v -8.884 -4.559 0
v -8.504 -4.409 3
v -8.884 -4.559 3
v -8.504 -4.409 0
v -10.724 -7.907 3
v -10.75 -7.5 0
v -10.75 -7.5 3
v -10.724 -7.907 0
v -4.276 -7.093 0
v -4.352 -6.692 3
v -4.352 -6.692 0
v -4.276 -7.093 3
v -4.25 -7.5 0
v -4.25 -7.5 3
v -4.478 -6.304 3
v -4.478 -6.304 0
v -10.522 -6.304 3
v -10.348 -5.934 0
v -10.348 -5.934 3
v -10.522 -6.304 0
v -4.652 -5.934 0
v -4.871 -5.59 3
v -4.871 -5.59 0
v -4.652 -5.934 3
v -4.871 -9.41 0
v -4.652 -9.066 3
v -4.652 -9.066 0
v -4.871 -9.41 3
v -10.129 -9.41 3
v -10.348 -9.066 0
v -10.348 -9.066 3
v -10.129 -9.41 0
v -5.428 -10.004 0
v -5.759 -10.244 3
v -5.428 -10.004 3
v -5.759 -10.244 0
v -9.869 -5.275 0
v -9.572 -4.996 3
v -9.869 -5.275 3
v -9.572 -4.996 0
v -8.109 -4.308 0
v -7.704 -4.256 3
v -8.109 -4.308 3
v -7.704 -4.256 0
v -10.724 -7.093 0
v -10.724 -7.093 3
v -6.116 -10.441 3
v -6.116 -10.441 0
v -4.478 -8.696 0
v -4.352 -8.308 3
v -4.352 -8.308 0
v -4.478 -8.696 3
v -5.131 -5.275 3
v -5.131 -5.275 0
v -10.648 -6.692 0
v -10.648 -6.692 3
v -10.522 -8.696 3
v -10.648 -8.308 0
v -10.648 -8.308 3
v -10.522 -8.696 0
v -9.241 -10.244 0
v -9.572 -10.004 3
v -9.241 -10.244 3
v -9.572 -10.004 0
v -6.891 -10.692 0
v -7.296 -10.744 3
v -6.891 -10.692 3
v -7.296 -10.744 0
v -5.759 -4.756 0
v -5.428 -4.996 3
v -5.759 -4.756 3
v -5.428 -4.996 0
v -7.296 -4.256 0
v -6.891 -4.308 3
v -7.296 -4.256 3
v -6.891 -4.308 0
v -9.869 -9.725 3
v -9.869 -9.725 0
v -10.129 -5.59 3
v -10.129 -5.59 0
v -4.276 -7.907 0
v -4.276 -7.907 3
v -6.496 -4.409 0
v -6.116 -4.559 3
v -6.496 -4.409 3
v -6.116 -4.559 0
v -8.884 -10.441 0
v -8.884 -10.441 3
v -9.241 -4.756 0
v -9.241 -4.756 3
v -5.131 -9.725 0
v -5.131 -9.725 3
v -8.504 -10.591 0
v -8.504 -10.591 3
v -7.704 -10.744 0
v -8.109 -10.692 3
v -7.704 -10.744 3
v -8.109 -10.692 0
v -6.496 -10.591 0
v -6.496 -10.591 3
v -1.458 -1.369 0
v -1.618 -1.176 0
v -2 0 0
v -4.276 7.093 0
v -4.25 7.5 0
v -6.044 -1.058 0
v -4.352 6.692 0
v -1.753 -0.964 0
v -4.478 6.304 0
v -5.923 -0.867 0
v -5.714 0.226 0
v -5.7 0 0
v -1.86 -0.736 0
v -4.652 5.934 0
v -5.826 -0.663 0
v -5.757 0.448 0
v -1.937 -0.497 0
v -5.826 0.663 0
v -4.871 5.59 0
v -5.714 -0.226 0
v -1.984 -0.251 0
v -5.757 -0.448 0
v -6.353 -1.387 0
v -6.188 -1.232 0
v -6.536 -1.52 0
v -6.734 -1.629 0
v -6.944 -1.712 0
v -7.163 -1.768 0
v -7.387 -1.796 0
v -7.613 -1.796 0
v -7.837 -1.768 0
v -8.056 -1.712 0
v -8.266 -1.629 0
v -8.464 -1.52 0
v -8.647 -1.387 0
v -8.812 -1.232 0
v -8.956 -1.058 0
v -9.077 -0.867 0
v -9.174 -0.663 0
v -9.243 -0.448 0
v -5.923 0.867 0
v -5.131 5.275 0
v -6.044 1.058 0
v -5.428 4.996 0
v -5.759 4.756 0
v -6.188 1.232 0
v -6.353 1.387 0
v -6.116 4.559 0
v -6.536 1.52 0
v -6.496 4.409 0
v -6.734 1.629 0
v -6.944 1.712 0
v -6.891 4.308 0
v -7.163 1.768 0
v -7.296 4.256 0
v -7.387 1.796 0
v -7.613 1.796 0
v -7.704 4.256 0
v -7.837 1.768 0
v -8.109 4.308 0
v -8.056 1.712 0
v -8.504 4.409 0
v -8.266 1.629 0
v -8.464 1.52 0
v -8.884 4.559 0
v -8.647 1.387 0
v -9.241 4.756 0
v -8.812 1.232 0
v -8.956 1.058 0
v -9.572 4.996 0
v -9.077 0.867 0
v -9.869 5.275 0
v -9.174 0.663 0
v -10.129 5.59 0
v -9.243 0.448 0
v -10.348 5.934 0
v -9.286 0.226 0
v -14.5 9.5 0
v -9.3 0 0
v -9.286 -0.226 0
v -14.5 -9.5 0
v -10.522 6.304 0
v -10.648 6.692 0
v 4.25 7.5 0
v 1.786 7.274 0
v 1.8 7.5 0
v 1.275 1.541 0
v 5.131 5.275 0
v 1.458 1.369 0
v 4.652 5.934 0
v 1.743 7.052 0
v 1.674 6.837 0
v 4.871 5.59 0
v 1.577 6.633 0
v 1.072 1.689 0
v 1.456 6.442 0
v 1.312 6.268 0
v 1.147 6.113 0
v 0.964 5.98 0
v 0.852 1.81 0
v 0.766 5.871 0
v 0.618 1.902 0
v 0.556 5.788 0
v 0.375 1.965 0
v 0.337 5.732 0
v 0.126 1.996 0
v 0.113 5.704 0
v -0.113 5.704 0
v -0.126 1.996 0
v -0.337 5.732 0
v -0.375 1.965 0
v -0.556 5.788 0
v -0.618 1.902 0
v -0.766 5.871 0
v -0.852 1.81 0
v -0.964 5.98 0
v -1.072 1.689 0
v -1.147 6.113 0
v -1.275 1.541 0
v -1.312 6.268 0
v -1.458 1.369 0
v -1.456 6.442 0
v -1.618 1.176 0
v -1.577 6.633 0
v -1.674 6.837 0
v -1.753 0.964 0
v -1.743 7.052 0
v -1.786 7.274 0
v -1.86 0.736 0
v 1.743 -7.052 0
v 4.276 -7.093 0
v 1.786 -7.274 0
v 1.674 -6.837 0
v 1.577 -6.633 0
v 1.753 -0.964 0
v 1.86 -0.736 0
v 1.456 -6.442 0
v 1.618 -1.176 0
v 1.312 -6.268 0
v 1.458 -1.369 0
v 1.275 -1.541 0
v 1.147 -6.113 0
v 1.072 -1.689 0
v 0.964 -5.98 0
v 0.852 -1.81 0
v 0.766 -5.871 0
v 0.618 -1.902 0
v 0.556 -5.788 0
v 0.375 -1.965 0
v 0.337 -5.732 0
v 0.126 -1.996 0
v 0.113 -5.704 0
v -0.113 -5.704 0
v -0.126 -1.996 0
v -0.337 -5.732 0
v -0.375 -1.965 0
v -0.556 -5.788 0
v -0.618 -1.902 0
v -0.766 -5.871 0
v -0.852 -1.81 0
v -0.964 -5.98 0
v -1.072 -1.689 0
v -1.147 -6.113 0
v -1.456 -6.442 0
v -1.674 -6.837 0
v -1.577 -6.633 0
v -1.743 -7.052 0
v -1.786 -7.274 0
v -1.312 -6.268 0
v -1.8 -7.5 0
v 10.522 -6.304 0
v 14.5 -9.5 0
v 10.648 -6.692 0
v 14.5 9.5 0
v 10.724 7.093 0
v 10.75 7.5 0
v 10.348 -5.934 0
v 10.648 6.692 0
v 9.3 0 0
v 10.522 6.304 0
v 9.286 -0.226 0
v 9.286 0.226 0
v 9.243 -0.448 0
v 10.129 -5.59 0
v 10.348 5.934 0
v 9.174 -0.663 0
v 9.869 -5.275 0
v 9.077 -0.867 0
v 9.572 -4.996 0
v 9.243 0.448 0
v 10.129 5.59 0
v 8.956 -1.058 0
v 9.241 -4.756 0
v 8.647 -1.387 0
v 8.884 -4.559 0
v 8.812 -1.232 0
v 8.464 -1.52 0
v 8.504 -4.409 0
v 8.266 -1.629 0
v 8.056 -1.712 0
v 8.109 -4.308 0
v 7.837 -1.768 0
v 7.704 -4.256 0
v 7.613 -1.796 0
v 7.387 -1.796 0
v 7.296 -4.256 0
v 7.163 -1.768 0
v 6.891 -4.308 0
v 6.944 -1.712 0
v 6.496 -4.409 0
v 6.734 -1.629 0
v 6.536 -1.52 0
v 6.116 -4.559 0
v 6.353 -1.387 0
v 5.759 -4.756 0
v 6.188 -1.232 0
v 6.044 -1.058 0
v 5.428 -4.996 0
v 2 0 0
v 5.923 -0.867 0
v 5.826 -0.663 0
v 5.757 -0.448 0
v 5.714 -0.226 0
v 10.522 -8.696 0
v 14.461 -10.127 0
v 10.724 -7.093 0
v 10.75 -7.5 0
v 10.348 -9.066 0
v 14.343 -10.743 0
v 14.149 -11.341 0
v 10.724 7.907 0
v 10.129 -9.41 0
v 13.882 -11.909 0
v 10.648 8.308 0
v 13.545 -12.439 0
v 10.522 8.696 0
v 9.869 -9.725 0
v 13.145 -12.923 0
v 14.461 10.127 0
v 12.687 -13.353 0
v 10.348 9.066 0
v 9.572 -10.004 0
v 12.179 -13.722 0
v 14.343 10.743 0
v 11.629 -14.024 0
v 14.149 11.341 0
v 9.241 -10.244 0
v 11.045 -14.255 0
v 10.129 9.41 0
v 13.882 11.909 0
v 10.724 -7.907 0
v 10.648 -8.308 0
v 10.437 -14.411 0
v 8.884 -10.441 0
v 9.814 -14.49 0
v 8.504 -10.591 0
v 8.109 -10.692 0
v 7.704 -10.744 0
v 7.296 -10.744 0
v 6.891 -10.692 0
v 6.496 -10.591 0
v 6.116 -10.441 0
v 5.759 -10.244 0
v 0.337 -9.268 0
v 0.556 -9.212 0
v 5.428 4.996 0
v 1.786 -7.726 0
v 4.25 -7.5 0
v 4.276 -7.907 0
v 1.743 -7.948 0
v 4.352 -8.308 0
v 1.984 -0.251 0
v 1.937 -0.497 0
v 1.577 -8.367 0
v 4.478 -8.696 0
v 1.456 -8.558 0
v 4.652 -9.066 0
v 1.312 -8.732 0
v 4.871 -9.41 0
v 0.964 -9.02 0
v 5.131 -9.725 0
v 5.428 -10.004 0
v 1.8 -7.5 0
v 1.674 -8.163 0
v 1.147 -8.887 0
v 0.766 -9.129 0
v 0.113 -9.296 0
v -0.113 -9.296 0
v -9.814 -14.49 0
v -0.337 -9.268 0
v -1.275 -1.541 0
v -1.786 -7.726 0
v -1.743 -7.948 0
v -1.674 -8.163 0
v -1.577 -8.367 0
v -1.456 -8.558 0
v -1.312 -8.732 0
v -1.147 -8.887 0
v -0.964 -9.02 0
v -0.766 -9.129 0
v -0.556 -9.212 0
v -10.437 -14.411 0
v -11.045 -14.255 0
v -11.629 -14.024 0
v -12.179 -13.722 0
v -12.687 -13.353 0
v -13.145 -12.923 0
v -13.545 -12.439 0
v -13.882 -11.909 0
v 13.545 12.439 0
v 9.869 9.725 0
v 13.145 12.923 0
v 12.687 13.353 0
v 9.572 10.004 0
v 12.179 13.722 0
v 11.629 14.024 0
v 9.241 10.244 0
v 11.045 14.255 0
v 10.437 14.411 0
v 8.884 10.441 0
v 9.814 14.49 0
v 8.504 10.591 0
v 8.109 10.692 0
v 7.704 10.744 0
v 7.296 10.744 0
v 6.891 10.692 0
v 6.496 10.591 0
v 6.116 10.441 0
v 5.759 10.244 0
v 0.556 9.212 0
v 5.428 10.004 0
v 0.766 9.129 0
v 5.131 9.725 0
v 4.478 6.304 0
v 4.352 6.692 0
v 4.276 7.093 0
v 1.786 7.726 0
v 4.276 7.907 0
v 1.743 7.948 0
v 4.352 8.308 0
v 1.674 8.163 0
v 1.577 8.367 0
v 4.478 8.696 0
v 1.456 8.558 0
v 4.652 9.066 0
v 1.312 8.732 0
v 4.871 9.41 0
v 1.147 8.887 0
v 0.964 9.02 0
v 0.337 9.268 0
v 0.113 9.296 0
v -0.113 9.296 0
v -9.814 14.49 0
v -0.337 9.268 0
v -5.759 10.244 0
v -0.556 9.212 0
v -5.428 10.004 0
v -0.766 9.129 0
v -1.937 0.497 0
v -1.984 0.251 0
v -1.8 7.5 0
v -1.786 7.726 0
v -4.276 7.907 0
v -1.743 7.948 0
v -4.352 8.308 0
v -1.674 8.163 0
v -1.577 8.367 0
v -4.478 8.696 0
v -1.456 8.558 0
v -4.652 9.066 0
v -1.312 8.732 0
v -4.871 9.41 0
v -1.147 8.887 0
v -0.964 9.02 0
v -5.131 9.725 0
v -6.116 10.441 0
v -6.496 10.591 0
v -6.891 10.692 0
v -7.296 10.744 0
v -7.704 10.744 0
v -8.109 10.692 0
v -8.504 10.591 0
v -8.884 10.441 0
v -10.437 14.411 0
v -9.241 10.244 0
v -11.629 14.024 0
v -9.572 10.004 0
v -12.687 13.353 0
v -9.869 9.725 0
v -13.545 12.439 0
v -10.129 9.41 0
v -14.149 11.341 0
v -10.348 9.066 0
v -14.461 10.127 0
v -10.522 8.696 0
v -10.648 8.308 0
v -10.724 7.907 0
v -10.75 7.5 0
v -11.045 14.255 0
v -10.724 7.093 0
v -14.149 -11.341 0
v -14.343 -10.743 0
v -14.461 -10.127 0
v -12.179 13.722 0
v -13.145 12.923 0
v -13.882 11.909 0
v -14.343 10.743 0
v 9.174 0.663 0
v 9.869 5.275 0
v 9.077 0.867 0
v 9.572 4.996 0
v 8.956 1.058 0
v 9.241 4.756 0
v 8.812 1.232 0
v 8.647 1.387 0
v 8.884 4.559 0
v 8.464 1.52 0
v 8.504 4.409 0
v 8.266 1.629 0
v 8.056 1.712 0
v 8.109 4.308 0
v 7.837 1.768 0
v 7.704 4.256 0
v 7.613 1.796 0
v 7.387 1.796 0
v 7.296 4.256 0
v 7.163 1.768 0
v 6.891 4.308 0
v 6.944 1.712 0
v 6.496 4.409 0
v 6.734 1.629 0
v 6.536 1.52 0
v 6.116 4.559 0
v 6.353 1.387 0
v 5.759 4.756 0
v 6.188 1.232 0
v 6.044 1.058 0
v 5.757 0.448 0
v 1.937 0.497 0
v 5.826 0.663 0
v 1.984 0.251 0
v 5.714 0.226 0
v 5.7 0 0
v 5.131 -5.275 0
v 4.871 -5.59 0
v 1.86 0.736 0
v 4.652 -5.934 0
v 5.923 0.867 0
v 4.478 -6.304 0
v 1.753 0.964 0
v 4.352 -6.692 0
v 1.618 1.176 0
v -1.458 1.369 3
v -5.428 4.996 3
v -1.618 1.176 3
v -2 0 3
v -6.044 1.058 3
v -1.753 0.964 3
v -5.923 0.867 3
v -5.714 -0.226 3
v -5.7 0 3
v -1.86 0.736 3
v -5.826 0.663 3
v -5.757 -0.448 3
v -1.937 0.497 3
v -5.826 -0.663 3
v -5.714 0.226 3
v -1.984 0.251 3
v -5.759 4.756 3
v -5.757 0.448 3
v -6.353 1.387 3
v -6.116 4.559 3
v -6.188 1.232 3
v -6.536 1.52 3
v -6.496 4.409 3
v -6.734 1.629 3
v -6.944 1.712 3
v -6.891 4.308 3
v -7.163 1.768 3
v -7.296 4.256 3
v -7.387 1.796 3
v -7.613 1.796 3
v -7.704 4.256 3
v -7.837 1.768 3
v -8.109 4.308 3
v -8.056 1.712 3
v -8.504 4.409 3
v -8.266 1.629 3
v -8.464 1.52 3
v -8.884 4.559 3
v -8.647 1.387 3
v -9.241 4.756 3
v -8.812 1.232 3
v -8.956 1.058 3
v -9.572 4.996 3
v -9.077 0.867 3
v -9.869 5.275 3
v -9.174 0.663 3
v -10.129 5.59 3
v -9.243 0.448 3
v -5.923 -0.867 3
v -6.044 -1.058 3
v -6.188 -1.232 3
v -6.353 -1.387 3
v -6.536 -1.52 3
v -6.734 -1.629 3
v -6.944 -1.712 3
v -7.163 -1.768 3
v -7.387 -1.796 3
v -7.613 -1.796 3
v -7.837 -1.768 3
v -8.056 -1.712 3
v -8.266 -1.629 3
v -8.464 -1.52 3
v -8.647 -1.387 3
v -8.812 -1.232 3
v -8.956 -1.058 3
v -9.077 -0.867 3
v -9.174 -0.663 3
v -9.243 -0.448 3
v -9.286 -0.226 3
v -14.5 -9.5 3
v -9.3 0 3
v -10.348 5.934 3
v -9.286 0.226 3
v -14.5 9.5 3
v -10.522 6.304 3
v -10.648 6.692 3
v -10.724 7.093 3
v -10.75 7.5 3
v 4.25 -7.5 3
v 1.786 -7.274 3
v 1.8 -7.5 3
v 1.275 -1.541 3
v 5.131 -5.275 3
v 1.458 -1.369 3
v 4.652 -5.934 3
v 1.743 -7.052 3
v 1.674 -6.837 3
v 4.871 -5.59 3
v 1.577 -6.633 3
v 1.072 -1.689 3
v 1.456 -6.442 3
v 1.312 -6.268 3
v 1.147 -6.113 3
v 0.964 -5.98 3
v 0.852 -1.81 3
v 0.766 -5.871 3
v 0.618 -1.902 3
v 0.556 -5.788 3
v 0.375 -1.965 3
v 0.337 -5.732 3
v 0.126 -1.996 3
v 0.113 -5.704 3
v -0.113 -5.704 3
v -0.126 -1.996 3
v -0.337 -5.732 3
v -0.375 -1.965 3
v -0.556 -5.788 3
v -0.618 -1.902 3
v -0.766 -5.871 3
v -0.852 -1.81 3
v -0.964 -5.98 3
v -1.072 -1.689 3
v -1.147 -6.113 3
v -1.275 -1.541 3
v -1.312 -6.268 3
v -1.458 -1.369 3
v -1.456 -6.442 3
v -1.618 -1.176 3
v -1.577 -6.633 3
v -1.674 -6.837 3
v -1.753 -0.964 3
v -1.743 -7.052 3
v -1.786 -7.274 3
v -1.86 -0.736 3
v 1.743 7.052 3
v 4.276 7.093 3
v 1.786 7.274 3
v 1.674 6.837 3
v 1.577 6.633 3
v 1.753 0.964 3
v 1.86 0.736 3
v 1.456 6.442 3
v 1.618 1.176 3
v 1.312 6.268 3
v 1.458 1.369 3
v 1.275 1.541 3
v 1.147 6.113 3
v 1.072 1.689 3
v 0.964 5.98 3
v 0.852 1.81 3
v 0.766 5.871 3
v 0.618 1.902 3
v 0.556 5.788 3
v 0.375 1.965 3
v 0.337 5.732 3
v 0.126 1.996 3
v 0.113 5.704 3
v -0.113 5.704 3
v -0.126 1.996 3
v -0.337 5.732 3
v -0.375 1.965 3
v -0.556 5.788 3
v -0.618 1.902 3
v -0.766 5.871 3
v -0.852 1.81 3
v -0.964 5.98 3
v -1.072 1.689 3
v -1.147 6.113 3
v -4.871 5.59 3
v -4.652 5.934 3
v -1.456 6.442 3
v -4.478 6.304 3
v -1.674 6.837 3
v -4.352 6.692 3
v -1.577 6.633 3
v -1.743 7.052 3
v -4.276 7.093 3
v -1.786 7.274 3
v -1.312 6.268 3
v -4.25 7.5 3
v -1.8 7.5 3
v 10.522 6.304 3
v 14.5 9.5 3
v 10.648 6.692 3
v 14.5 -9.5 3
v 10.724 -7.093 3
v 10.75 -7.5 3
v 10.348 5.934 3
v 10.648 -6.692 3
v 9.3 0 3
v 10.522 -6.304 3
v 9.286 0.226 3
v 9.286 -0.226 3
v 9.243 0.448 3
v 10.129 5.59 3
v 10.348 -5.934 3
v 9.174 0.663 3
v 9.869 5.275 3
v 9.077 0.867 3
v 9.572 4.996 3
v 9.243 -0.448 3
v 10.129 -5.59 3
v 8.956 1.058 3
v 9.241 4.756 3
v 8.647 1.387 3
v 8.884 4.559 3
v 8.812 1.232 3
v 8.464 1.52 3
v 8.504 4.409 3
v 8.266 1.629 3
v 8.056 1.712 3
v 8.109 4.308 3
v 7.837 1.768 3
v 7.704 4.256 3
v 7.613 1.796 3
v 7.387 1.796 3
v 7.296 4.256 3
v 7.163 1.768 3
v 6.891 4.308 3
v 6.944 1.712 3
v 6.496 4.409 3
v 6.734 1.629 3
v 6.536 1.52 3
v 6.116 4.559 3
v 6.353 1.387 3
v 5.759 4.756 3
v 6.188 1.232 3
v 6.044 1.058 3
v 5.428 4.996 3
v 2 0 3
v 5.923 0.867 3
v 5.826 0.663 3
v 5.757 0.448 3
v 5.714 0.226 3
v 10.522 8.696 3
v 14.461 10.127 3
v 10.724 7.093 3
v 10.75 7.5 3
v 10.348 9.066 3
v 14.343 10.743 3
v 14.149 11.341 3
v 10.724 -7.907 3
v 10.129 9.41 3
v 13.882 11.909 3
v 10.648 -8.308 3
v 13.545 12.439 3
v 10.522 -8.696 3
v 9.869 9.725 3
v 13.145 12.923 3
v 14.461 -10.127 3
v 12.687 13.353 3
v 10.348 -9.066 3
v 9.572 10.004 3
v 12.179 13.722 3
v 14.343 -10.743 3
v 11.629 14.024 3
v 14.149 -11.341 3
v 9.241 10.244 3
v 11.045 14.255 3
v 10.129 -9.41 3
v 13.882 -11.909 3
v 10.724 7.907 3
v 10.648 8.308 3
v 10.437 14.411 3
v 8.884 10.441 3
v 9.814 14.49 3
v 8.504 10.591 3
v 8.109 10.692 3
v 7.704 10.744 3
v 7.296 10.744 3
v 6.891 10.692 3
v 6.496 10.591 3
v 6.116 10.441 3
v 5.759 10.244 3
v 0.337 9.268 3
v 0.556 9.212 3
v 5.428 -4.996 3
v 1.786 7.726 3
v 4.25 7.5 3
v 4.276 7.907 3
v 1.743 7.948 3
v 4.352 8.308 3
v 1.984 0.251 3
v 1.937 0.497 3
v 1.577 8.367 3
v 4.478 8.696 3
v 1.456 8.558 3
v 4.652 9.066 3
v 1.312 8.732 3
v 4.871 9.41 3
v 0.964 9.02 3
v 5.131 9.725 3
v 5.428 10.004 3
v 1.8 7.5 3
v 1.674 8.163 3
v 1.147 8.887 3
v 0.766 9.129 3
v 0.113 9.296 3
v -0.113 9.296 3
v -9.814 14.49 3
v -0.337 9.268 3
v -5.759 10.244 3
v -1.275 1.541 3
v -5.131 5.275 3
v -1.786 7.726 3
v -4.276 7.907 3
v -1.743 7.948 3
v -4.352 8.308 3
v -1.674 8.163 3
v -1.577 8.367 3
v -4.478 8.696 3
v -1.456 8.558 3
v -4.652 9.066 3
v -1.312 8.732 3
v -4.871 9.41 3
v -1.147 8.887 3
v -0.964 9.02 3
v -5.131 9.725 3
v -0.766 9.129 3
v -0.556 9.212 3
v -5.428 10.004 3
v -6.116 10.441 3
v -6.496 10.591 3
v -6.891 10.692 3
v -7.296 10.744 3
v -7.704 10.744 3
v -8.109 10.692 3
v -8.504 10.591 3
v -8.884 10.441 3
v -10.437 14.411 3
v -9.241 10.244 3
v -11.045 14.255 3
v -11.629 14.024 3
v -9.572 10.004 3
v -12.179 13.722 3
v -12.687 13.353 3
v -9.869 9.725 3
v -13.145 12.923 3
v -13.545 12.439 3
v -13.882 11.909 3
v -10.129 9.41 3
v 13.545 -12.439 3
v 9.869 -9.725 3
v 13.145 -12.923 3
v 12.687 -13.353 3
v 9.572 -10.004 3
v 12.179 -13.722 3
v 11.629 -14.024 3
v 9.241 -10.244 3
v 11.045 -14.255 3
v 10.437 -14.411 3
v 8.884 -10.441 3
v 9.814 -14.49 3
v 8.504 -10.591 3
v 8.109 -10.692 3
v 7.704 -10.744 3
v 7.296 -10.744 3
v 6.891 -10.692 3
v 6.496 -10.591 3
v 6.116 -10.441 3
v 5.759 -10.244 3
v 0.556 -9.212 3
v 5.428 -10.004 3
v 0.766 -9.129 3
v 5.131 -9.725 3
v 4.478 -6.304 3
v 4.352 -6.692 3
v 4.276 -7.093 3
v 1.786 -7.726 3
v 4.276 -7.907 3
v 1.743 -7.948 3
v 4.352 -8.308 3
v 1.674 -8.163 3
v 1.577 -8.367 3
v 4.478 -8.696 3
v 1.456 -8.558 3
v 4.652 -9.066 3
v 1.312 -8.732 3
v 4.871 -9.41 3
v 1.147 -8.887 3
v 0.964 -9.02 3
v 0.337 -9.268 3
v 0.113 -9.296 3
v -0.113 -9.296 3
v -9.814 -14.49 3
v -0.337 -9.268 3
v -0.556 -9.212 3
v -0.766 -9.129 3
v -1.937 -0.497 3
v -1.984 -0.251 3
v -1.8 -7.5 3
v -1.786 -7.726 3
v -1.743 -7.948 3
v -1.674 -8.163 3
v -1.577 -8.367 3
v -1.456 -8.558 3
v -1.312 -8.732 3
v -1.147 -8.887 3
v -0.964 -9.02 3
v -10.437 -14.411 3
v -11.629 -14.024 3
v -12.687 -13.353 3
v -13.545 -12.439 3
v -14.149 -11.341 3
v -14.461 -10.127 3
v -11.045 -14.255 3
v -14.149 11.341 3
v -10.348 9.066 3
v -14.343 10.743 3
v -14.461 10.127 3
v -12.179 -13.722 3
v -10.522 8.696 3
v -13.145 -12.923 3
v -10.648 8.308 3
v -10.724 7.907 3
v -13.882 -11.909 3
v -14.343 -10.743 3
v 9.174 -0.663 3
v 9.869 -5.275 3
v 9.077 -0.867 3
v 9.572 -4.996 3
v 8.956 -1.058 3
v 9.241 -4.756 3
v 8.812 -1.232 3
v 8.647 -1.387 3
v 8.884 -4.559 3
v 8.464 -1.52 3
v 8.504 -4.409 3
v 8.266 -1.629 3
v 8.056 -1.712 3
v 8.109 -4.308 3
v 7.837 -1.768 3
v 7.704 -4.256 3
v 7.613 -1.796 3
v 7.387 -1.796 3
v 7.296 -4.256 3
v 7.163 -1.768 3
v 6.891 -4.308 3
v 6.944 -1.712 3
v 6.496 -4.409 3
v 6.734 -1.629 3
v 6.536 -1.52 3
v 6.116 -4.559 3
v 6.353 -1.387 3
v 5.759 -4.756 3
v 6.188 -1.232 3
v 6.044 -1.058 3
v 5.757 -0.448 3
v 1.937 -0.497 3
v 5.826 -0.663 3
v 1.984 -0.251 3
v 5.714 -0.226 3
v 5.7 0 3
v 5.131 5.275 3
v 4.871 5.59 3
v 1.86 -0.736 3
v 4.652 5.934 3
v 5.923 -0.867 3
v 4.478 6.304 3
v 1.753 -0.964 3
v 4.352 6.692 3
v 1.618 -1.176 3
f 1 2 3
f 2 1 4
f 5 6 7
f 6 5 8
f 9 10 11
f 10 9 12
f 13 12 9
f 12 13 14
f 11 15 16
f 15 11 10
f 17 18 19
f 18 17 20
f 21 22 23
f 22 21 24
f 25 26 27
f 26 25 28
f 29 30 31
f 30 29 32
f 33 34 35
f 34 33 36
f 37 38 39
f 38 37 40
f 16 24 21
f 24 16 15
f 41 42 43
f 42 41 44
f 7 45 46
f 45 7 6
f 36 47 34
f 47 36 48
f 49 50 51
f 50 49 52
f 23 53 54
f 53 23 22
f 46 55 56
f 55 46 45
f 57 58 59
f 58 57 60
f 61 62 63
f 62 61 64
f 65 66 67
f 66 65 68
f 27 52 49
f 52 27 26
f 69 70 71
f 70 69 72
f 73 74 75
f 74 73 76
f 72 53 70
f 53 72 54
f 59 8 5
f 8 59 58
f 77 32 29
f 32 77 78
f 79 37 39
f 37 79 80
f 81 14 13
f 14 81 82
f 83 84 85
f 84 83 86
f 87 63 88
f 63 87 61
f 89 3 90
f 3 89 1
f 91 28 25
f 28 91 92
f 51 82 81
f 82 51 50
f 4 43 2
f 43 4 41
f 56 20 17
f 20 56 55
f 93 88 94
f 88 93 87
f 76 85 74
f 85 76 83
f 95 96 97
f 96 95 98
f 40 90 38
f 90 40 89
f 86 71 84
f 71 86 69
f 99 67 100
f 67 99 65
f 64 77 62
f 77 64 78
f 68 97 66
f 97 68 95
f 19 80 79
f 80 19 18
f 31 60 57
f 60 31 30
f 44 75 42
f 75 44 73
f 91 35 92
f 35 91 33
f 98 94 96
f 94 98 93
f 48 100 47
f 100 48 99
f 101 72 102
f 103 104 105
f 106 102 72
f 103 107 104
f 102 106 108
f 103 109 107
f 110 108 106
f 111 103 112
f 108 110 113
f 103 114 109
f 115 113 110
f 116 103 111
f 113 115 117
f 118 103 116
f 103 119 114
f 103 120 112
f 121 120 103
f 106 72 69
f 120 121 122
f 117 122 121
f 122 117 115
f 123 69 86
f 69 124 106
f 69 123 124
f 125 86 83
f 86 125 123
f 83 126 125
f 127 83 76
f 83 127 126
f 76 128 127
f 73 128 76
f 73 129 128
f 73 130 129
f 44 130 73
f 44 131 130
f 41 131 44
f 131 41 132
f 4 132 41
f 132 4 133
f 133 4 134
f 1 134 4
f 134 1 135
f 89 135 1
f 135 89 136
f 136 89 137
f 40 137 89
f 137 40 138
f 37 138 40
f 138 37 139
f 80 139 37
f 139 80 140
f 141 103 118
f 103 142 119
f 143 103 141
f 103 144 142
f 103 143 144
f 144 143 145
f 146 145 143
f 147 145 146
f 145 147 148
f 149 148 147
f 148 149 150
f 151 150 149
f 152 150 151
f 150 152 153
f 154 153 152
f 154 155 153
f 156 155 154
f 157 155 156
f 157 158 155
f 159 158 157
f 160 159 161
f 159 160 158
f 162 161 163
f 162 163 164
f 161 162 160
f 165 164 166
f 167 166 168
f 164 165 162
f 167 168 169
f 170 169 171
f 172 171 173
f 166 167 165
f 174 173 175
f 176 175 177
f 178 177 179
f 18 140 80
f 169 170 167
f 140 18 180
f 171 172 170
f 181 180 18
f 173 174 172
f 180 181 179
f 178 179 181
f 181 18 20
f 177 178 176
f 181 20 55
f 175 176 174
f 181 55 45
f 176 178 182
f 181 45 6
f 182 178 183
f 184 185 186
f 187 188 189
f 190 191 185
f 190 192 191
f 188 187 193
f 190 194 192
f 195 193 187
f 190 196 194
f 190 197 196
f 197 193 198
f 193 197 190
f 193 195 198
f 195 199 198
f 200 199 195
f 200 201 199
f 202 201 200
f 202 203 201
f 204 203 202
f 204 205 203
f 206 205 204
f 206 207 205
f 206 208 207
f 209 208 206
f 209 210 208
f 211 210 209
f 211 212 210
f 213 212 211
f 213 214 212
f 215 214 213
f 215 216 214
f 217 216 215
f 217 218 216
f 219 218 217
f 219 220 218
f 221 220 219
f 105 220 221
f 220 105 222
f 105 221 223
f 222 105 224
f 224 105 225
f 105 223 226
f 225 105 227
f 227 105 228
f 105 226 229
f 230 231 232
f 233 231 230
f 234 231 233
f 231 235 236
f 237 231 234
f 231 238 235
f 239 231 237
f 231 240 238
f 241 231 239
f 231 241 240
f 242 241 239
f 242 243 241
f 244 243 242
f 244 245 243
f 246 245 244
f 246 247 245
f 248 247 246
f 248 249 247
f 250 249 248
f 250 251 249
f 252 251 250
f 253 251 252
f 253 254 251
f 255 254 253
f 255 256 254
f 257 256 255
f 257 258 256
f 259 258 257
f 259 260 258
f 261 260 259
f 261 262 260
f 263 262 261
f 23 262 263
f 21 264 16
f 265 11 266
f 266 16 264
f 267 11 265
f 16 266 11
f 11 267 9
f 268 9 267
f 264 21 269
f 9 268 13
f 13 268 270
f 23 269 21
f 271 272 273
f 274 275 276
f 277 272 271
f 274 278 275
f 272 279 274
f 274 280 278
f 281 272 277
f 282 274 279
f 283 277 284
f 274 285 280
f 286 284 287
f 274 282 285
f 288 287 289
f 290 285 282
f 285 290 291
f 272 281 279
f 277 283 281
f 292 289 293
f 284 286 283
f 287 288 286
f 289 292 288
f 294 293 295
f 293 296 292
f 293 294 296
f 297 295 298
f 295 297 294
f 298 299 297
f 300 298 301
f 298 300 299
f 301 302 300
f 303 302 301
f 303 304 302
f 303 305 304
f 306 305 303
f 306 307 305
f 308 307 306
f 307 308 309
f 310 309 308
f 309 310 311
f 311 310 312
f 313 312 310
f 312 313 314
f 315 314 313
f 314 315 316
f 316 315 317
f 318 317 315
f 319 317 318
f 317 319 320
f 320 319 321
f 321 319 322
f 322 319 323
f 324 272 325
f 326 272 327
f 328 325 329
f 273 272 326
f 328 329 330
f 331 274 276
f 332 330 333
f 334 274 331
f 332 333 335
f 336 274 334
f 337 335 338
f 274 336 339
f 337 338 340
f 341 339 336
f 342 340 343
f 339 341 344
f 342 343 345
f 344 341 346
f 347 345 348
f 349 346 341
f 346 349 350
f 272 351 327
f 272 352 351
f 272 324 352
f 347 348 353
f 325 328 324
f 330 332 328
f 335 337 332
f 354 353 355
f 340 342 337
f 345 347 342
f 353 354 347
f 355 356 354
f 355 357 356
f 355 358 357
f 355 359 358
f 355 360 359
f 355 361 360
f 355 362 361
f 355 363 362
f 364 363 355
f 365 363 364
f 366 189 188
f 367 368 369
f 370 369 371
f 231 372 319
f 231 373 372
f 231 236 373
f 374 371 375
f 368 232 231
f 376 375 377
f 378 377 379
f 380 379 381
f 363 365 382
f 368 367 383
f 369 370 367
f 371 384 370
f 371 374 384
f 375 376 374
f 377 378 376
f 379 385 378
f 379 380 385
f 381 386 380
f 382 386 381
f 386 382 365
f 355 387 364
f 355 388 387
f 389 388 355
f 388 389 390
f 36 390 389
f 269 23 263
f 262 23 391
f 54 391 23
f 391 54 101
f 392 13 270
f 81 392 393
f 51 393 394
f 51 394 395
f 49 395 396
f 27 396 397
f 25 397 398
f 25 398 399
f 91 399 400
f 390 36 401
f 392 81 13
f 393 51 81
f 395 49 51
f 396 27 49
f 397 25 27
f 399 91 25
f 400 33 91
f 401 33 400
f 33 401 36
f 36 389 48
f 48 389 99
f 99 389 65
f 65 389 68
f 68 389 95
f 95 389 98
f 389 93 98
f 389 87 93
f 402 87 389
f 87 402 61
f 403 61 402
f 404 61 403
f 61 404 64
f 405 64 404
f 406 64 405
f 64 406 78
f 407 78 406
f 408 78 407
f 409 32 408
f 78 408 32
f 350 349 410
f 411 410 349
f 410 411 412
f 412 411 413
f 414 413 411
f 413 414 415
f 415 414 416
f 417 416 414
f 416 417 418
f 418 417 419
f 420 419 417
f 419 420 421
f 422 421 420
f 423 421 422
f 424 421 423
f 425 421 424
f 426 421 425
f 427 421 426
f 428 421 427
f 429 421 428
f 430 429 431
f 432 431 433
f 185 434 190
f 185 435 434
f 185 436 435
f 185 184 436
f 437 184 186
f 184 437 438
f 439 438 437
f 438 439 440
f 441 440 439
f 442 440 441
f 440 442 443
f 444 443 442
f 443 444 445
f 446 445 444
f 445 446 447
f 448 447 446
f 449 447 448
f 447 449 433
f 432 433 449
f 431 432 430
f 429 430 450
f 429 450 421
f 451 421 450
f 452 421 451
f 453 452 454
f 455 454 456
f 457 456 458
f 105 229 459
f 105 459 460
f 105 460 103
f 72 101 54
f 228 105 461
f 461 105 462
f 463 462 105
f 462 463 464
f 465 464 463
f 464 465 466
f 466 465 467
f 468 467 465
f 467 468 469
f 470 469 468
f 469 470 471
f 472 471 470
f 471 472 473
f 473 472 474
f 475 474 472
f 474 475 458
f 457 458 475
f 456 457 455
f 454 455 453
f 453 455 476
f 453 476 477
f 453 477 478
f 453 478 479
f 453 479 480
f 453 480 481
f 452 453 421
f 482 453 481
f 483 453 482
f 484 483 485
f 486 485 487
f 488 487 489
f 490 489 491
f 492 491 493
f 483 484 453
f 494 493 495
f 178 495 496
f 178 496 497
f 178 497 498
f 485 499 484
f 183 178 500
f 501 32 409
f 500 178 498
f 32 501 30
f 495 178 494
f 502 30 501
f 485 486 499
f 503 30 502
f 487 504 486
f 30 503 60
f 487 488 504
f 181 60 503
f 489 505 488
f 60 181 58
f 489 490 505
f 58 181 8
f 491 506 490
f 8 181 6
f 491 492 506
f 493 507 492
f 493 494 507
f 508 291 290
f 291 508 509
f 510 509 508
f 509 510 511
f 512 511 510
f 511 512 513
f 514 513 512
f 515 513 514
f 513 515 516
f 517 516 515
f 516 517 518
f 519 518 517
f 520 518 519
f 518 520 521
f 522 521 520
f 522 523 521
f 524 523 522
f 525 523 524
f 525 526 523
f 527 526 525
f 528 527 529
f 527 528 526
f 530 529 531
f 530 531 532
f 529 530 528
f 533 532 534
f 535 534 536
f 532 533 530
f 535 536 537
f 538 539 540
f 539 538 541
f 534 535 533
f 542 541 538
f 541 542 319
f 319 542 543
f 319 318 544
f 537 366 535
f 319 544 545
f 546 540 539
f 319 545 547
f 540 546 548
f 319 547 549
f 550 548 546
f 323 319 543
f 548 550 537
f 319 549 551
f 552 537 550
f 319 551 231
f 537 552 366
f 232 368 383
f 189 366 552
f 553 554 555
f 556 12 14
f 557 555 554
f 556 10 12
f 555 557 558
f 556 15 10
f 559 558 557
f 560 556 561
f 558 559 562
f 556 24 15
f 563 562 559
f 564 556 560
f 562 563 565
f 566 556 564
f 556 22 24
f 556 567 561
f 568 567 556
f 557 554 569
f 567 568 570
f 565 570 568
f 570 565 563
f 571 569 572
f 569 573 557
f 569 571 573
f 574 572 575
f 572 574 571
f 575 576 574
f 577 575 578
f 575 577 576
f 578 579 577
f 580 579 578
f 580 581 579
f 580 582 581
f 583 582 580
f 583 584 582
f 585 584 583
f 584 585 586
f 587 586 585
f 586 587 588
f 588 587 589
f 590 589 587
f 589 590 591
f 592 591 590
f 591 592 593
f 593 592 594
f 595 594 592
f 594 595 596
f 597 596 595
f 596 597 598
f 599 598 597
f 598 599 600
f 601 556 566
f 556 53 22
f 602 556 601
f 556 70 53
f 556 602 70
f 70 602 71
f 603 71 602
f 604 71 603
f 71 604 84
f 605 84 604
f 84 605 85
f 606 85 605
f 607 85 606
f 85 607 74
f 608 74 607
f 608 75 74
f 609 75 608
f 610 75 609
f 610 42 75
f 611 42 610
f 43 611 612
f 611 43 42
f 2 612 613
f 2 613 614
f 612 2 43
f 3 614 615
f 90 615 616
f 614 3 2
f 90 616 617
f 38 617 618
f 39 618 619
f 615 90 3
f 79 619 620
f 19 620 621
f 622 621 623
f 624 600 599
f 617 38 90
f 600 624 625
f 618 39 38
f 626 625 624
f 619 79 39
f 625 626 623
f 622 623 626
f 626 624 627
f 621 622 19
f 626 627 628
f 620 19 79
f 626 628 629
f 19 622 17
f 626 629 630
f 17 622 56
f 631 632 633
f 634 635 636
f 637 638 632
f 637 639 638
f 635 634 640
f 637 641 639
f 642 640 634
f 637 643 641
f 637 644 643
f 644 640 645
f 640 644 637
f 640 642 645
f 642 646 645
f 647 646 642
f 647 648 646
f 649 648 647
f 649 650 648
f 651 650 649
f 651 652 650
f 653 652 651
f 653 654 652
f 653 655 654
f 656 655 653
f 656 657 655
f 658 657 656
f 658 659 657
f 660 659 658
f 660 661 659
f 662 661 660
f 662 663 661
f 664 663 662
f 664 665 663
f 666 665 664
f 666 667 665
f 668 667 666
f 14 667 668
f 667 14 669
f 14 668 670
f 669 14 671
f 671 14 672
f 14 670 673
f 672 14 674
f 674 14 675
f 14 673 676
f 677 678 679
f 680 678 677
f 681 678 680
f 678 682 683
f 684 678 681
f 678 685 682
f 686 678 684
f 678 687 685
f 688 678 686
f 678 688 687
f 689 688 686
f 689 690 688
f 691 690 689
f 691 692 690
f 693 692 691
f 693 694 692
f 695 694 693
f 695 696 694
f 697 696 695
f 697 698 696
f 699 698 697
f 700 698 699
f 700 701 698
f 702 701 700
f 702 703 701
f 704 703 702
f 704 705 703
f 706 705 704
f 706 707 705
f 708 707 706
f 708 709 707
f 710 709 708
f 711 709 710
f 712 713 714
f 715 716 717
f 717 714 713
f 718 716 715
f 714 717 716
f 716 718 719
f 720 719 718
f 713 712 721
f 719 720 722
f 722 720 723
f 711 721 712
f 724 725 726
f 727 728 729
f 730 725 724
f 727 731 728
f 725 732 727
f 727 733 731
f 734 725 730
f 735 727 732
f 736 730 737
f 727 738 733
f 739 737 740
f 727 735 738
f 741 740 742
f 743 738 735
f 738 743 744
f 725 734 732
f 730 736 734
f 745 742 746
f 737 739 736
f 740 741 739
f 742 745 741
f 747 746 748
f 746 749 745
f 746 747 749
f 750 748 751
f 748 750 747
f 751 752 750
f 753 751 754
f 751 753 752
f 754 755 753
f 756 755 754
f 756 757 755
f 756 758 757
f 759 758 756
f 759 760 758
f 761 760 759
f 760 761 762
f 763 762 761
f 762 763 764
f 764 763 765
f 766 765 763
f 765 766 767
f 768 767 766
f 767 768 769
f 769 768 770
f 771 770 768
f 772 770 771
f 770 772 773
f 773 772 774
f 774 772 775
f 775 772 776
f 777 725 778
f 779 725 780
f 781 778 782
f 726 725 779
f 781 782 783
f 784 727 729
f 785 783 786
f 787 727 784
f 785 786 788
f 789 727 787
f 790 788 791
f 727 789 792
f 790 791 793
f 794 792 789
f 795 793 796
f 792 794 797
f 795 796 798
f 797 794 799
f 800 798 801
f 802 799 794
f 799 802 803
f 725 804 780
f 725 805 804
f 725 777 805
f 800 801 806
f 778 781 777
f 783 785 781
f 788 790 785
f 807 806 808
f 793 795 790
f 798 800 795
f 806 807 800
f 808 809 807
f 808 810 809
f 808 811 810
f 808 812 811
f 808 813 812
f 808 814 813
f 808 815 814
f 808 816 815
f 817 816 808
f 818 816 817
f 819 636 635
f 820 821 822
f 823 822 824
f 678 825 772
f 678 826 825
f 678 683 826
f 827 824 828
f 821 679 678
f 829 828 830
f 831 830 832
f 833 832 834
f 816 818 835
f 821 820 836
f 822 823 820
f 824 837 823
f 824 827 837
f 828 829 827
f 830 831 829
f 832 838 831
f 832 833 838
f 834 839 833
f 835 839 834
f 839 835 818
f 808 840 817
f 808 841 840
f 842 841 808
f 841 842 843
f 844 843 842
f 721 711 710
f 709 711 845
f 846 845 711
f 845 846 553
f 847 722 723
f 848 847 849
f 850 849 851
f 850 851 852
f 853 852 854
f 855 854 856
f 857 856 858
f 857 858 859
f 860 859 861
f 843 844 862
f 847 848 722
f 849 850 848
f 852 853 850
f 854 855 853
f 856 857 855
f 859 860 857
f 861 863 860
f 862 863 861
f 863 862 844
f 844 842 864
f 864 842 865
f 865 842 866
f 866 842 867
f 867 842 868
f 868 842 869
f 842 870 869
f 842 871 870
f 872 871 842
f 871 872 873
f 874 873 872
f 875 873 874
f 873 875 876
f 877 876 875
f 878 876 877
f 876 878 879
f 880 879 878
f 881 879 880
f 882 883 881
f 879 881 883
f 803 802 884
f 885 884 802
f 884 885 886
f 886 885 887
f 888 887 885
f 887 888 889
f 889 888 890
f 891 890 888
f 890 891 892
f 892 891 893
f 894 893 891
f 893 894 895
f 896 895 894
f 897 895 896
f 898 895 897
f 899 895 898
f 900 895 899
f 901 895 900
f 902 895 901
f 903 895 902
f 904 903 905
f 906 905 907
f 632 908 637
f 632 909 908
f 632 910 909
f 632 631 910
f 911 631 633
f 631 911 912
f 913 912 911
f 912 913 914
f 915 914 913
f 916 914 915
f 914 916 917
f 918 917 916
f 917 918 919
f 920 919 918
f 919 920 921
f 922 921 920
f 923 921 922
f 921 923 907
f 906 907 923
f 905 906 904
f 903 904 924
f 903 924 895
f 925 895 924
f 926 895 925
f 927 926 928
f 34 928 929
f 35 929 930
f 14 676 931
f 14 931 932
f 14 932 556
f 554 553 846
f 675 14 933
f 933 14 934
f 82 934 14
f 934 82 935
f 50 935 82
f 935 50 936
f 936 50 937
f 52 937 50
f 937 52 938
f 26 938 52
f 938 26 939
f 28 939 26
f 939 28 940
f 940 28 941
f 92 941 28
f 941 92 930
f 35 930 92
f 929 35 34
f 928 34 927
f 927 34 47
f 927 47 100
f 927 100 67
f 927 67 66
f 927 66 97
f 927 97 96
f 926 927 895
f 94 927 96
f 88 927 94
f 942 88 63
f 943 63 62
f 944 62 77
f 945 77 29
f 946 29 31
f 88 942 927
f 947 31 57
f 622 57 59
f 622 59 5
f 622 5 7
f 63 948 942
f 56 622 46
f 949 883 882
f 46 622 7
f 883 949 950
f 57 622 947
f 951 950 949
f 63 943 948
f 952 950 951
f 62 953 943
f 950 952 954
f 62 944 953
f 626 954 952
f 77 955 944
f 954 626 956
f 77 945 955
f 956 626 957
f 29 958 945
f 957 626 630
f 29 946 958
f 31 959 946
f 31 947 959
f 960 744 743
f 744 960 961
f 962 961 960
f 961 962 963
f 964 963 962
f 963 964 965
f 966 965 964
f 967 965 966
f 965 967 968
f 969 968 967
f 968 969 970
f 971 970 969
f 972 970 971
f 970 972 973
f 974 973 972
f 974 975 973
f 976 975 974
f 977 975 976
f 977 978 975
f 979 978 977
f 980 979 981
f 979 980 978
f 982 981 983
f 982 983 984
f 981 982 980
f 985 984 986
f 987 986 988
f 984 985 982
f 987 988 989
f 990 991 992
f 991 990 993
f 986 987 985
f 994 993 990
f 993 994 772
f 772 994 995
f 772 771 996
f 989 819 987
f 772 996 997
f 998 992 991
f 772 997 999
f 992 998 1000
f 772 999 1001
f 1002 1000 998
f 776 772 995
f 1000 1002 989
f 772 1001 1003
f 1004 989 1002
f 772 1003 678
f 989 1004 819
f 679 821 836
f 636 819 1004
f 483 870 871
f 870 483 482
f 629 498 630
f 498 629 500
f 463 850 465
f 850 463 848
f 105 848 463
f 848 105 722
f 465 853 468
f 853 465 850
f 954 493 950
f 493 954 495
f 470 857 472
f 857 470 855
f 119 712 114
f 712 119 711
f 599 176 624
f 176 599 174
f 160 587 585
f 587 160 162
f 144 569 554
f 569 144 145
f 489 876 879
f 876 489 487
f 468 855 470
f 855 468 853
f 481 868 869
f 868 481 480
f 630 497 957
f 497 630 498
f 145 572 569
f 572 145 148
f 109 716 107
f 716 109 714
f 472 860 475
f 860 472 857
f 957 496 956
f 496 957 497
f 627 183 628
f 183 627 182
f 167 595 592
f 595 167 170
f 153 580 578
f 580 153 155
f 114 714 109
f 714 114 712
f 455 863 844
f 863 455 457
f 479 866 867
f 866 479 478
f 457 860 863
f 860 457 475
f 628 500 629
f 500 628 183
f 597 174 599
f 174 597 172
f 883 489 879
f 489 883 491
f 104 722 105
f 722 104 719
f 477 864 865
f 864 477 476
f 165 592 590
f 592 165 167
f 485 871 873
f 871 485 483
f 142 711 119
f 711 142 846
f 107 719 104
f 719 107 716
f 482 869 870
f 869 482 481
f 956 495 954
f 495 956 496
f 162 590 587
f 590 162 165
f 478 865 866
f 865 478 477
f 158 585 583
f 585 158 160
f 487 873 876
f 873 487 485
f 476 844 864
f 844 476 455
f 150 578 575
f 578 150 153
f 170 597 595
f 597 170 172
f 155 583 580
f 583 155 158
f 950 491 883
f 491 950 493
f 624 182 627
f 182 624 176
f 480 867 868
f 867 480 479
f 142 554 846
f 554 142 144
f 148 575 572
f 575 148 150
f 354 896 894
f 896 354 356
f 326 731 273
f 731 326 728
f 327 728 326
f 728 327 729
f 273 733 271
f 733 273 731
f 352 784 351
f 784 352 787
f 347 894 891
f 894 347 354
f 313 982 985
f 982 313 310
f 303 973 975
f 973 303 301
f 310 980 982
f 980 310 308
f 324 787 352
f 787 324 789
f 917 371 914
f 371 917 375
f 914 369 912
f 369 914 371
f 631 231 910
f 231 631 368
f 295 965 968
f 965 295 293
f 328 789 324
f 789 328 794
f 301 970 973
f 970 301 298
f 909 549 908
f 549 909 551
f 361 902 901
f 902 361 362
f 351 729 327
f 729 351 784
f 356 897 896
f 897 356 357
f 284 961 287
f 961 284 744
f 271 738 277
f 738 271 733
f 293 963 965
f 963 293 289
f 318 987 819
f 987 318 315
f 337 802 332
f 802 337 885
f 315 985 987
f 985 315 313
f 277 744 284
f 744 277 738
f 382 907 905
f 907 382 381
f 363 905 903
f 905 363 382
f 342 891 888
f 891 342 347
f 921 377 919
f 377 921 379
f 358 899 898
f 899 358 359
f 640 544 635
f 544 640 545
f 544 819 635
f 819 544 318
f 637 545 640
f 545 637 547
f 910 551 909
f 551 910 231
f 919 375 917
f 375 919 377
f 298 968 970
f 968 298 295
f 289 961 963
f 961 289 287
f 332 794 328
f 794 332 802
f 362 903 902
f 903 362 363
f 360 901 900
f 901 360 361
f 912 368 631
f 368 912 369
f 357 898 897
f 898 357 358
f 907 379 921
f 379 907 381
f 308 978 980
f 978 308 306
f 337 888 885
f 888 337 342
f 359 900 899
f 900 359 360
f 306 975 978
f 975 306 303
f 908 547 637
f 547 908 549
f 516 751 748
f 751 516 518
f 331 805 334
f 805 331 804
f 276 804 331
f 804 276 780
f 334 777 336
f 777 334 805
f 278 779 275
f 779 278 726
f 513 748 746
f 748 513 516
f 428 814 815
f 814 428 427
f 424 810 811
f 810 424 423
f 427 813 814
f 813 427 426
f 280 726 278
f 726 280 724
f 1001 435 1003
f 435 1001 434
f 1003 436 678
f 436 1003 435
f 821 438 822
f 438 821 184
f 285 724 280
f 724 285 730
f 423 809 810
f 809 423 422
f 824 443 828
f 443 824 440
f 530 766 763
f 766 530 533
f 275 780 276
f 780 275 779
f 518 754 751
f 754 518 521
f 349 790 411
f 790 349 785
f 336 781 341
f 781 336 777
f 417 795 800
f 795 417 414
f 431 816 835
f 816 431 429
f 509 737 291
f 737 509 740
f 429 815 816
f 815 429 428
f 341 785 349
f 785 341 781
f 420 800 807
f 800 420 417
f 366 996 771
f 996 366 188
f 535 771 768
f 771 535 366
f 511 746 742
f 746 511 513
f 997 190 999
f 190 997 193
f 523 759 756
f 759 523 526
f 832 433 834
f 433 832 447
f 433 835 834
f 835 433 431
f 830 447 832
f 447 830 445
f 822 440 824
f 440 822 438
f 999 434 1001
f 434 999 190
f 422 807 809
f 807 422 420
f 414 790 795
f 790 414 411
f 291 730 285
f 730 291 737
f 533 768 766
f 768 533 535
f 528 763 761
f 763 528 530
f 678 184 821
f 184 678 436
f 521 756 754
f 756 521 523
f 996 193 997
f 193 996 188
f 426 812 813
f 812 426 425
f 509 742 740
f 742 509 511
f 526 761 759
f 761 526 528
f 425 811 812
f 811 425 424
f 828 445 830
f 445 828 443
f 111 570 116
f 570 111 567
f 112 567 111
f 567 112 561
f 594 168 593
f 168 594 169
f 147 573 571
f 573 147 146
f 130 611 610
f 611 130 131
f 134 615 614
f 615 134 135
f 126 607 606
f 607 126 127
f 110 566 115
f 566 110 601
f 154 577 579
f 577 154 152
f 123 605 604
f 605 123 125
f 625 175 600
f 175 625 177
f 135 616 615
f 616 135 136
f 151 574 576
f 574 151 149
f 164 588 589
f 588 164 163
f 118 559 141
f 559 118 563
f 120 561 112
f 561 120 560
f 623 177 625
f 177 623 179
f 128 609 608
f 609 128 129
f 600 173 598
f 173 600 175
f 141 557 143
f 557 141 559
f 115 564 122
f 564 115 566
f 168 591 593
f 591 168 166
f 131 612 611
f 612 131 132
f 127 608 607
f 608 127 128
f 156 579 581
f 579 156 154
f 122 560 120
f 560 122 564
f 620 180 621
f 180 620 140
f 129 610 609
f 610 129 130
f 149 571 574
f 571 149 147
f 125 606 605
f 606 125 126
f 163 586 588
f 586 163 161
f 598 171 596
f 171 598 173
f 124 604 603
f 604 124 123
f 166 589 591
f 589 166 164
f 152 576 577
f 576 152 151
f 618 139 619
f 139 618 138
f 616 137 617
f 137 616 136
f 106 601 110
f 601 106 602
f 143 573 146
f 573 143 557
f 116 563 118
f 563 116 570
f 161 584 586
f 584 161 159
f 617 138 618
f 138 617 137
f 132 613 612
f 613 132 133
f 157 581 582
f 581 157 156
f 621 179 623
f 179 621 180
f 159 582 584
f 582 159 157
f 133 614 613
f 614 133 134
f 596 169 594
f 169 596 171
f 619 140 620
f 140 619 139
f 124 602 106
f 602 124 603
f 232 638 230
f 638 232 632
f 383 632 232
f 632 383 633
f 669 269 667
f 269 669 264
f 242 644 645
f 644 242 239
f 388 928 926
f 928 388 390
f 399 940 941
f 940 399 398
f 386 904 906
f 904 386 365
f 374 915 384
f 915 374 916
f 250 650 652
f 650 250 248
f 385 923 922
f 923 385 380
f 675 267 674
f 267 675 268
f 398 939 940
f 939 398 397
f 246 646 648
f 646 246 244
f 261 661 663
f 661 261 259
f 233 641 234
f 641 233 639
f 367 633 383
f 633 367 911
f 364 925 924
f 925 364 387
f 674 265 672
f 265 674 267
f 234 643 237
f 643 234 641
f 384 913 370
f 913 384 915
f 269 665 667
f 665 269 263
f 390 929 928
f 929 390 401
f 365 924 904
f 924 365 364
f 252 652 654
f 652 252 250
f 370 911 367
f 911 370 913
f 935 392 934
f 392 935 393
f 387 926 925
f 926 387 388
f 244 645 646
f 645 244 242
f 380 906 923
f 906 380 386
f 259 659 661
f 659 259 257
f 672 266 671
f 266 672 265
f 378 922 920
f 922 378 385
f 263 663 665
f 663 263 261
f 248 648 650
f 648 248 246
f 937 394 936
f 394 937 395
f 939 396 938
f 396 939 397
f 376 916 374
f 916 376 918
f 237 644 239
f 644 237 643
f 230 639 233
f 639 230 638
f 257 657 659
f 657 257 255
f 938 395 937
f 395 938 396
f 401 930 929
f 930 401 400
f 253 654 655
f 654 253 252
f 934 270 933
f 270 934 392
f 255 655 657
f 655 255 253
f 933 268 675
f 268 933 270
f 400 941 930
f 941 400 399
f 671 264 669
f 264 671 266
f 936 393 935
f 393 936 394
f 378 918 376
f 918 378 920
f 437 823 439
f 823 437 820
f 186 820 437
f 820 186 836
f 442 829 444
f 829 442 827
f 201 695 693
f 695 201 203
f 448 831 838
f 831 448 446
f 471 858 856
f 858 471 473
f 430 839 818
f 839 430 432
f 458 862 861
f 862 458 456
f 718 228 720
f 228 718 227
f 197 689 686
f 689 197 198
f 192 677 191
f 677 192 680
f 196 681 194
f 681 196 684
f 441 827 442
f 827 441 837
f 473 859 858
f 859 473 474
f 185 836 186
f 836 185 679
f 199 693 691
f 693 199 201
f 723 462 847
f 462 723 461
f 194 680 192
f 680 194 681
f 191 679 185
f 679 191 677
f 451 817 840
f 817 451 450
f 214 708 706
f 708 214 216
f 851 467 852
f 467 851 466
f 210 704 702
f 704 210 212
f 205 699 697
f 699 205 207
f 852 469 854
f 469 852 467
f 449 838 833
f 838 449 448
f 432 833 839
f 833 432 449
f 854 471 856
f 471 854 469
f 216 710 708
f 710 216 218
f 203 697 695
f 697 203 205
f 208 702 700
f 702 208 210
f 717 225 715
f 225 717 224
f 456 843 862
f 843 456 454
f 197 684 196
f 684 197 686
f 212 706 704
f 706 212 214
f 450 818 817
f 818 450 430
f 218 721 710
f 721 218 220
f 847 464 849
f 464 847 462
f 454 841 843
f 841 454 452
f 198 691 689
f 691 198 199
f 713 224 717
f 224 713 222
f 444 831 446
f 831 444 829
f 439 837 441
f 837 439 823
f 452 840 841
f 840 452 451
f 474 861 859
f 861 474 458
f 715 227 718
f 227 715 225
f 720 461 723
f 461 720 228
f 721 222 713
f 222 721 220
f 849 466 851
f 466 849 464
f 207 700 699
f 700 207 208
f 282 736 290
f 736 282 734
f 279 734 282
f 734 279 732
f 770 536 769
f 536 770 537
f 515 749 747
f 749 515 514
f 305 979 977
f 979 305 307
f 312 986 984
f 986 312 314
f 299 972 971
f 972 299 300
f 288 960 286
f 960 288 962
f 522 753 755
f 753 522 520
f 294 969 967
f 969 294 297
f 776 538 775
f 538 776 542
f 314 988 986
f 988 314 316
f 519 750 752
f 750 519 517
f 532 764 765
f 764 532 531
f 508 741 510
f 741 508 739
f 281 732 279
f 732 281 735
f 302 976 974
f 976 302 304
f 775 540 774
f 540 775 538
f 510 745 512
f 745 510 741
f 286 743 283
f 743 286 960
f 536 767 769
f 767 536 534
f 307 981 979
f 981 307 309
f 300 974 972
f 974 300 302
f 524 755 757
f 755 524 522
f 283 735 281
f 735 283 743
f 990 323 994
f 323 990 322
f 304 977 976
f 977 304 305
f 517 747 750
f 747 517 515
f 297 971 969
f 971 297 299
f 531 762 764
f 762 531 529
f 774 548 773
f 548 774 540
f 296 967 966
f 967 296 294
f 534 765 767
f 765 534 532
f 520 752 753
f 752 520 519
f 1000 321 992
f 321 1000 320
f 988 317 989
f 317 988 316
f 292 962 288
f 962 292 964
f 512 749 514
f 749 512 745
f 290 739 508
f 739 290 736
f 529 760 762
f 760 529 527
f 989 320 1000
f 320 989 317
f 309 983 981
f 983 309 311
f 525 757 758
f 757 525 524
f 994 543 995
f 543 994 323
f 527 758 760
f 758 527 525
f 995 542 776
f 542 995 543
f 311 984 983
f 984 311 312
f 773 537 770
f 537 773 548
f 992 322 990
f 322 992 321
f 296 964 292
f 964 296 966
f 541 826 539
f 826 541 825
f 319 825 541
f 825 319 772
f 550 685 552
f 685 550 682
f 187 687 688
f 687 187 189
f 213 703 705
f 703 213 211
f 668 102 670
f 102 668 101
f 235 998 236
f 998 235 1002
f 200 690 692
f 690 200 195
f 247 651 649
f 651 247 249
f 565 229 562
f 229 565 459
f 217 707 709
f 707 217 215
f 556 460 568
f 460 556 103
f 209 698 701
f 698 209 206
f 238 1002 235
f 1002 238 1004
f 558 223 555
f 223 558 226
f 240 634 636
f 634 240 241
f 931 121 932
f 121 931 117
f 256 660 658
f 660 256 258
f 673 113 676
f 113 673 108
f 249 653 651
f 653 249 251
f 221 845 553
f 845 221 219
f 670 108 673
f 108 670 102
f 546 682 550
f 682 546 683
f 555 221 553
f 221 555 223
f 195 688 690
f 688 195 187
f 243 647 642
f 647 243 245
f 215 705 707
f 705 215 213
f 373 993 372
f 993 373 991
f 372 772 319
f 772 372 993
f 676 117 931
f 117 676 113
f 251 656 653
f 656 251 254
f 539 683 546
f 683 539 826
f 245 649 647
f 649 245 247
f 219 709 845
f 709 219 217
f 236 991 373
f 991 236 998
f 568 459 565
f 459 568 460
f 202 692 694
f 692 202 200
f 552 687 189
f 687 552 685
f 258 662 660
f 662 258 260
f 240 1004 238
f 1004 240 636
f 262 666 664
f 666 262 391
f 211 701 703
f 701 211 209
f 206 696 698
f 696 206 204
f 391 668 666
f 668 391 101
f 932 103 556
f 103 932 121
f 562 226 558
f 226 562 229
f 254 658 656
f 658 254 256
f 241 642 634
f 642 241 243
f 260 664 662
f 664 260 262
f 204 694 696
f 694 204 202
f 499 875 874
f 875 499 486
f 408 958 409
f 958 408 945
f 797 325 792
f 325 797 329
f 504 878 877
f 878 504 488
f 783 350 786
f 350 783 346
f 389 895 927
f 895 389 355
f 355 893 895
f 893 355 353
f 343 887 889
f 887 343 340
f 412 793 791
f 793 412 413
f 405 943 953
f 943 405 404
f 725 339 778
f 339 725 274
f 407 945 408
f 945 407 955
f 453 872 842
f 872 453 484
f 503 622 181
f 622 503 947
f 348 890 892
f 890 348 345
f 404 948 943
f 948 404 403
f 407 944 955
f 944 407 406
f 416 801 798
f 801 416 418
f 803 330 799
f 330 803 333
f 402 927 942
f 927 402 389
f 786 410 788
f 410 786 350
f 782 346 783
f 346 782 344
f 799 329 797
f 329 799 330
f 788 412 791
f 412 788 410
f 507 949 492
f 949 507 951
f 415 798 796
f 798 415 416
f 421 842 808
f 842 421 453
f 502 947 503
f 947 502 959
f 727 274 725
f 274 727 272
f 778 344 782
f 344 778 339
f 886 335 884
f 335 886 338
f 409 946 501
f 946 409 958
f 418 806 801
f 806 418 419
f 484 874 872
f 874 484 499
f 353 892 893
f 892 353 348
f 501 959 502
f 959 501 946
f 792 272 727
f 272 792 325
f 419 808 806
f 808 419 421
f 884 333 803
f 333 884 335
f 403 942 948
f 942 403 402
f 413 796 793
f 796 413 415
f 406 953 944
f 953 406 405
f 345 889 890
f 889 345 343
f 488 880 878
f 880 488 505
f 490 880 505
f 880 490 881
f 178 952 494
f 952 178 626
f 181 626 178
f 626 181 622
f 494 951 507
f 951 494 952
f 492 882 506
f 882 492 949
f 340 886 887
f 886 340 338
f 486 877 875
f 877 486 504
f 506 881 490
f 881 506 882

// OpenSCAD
$fn = 50;

difference() {
	union() {
		hull() {
			translate(v = [-9.5, 9.5, 0]) {
				cylinder(h = 3, r = 5);
			}
			translate(v = [9.5, 9.5, 0]) {
				cylinder(h = 3, r = 5);
			}
			translate(v = [-9.5, -9.5, 0]) {
				cylinder(h = 3, r = 5);
			}
			translate(v = [9.5, -9.5, 0]) {
				cylinder(h = 3, r = 5);
			}
		}
	}
	union() {
		translate(v = [-7.5, -7.5, 0]) {
			cylinder(h = 3, r = 3.25);
		}
		translate(v = [-7.5, 7.5, 0]) {
			cylinder(h = 3, r = 3.25);
		}
		translate(v = [7.5, -7.5, 0]) {
			cylinder(h = 3, r = 3.25);
		}
		translate(v = [7.5, 7.5, 0]) {
			cylinder(h = 3, r = 3.25);
		}
		translate(v = [-7.5, 0.0, 0]) {
			cylinder(h = 3, r = 1.8);
		}
		translate(v = [0.0, -7.5, 0]) {
			cylinder(h = 3, r = 1.8);
		}
		translate(v = [0.0, 7.5, 0]) {
			cylinder(h = 3, r = 1.8);
		}
		translate(v = [7.5, 0.0, 0]) {
			cylinder(h = 3, r = 1.8);
		}
		cylinder(h = 3, r = 2.0);
	}
}
